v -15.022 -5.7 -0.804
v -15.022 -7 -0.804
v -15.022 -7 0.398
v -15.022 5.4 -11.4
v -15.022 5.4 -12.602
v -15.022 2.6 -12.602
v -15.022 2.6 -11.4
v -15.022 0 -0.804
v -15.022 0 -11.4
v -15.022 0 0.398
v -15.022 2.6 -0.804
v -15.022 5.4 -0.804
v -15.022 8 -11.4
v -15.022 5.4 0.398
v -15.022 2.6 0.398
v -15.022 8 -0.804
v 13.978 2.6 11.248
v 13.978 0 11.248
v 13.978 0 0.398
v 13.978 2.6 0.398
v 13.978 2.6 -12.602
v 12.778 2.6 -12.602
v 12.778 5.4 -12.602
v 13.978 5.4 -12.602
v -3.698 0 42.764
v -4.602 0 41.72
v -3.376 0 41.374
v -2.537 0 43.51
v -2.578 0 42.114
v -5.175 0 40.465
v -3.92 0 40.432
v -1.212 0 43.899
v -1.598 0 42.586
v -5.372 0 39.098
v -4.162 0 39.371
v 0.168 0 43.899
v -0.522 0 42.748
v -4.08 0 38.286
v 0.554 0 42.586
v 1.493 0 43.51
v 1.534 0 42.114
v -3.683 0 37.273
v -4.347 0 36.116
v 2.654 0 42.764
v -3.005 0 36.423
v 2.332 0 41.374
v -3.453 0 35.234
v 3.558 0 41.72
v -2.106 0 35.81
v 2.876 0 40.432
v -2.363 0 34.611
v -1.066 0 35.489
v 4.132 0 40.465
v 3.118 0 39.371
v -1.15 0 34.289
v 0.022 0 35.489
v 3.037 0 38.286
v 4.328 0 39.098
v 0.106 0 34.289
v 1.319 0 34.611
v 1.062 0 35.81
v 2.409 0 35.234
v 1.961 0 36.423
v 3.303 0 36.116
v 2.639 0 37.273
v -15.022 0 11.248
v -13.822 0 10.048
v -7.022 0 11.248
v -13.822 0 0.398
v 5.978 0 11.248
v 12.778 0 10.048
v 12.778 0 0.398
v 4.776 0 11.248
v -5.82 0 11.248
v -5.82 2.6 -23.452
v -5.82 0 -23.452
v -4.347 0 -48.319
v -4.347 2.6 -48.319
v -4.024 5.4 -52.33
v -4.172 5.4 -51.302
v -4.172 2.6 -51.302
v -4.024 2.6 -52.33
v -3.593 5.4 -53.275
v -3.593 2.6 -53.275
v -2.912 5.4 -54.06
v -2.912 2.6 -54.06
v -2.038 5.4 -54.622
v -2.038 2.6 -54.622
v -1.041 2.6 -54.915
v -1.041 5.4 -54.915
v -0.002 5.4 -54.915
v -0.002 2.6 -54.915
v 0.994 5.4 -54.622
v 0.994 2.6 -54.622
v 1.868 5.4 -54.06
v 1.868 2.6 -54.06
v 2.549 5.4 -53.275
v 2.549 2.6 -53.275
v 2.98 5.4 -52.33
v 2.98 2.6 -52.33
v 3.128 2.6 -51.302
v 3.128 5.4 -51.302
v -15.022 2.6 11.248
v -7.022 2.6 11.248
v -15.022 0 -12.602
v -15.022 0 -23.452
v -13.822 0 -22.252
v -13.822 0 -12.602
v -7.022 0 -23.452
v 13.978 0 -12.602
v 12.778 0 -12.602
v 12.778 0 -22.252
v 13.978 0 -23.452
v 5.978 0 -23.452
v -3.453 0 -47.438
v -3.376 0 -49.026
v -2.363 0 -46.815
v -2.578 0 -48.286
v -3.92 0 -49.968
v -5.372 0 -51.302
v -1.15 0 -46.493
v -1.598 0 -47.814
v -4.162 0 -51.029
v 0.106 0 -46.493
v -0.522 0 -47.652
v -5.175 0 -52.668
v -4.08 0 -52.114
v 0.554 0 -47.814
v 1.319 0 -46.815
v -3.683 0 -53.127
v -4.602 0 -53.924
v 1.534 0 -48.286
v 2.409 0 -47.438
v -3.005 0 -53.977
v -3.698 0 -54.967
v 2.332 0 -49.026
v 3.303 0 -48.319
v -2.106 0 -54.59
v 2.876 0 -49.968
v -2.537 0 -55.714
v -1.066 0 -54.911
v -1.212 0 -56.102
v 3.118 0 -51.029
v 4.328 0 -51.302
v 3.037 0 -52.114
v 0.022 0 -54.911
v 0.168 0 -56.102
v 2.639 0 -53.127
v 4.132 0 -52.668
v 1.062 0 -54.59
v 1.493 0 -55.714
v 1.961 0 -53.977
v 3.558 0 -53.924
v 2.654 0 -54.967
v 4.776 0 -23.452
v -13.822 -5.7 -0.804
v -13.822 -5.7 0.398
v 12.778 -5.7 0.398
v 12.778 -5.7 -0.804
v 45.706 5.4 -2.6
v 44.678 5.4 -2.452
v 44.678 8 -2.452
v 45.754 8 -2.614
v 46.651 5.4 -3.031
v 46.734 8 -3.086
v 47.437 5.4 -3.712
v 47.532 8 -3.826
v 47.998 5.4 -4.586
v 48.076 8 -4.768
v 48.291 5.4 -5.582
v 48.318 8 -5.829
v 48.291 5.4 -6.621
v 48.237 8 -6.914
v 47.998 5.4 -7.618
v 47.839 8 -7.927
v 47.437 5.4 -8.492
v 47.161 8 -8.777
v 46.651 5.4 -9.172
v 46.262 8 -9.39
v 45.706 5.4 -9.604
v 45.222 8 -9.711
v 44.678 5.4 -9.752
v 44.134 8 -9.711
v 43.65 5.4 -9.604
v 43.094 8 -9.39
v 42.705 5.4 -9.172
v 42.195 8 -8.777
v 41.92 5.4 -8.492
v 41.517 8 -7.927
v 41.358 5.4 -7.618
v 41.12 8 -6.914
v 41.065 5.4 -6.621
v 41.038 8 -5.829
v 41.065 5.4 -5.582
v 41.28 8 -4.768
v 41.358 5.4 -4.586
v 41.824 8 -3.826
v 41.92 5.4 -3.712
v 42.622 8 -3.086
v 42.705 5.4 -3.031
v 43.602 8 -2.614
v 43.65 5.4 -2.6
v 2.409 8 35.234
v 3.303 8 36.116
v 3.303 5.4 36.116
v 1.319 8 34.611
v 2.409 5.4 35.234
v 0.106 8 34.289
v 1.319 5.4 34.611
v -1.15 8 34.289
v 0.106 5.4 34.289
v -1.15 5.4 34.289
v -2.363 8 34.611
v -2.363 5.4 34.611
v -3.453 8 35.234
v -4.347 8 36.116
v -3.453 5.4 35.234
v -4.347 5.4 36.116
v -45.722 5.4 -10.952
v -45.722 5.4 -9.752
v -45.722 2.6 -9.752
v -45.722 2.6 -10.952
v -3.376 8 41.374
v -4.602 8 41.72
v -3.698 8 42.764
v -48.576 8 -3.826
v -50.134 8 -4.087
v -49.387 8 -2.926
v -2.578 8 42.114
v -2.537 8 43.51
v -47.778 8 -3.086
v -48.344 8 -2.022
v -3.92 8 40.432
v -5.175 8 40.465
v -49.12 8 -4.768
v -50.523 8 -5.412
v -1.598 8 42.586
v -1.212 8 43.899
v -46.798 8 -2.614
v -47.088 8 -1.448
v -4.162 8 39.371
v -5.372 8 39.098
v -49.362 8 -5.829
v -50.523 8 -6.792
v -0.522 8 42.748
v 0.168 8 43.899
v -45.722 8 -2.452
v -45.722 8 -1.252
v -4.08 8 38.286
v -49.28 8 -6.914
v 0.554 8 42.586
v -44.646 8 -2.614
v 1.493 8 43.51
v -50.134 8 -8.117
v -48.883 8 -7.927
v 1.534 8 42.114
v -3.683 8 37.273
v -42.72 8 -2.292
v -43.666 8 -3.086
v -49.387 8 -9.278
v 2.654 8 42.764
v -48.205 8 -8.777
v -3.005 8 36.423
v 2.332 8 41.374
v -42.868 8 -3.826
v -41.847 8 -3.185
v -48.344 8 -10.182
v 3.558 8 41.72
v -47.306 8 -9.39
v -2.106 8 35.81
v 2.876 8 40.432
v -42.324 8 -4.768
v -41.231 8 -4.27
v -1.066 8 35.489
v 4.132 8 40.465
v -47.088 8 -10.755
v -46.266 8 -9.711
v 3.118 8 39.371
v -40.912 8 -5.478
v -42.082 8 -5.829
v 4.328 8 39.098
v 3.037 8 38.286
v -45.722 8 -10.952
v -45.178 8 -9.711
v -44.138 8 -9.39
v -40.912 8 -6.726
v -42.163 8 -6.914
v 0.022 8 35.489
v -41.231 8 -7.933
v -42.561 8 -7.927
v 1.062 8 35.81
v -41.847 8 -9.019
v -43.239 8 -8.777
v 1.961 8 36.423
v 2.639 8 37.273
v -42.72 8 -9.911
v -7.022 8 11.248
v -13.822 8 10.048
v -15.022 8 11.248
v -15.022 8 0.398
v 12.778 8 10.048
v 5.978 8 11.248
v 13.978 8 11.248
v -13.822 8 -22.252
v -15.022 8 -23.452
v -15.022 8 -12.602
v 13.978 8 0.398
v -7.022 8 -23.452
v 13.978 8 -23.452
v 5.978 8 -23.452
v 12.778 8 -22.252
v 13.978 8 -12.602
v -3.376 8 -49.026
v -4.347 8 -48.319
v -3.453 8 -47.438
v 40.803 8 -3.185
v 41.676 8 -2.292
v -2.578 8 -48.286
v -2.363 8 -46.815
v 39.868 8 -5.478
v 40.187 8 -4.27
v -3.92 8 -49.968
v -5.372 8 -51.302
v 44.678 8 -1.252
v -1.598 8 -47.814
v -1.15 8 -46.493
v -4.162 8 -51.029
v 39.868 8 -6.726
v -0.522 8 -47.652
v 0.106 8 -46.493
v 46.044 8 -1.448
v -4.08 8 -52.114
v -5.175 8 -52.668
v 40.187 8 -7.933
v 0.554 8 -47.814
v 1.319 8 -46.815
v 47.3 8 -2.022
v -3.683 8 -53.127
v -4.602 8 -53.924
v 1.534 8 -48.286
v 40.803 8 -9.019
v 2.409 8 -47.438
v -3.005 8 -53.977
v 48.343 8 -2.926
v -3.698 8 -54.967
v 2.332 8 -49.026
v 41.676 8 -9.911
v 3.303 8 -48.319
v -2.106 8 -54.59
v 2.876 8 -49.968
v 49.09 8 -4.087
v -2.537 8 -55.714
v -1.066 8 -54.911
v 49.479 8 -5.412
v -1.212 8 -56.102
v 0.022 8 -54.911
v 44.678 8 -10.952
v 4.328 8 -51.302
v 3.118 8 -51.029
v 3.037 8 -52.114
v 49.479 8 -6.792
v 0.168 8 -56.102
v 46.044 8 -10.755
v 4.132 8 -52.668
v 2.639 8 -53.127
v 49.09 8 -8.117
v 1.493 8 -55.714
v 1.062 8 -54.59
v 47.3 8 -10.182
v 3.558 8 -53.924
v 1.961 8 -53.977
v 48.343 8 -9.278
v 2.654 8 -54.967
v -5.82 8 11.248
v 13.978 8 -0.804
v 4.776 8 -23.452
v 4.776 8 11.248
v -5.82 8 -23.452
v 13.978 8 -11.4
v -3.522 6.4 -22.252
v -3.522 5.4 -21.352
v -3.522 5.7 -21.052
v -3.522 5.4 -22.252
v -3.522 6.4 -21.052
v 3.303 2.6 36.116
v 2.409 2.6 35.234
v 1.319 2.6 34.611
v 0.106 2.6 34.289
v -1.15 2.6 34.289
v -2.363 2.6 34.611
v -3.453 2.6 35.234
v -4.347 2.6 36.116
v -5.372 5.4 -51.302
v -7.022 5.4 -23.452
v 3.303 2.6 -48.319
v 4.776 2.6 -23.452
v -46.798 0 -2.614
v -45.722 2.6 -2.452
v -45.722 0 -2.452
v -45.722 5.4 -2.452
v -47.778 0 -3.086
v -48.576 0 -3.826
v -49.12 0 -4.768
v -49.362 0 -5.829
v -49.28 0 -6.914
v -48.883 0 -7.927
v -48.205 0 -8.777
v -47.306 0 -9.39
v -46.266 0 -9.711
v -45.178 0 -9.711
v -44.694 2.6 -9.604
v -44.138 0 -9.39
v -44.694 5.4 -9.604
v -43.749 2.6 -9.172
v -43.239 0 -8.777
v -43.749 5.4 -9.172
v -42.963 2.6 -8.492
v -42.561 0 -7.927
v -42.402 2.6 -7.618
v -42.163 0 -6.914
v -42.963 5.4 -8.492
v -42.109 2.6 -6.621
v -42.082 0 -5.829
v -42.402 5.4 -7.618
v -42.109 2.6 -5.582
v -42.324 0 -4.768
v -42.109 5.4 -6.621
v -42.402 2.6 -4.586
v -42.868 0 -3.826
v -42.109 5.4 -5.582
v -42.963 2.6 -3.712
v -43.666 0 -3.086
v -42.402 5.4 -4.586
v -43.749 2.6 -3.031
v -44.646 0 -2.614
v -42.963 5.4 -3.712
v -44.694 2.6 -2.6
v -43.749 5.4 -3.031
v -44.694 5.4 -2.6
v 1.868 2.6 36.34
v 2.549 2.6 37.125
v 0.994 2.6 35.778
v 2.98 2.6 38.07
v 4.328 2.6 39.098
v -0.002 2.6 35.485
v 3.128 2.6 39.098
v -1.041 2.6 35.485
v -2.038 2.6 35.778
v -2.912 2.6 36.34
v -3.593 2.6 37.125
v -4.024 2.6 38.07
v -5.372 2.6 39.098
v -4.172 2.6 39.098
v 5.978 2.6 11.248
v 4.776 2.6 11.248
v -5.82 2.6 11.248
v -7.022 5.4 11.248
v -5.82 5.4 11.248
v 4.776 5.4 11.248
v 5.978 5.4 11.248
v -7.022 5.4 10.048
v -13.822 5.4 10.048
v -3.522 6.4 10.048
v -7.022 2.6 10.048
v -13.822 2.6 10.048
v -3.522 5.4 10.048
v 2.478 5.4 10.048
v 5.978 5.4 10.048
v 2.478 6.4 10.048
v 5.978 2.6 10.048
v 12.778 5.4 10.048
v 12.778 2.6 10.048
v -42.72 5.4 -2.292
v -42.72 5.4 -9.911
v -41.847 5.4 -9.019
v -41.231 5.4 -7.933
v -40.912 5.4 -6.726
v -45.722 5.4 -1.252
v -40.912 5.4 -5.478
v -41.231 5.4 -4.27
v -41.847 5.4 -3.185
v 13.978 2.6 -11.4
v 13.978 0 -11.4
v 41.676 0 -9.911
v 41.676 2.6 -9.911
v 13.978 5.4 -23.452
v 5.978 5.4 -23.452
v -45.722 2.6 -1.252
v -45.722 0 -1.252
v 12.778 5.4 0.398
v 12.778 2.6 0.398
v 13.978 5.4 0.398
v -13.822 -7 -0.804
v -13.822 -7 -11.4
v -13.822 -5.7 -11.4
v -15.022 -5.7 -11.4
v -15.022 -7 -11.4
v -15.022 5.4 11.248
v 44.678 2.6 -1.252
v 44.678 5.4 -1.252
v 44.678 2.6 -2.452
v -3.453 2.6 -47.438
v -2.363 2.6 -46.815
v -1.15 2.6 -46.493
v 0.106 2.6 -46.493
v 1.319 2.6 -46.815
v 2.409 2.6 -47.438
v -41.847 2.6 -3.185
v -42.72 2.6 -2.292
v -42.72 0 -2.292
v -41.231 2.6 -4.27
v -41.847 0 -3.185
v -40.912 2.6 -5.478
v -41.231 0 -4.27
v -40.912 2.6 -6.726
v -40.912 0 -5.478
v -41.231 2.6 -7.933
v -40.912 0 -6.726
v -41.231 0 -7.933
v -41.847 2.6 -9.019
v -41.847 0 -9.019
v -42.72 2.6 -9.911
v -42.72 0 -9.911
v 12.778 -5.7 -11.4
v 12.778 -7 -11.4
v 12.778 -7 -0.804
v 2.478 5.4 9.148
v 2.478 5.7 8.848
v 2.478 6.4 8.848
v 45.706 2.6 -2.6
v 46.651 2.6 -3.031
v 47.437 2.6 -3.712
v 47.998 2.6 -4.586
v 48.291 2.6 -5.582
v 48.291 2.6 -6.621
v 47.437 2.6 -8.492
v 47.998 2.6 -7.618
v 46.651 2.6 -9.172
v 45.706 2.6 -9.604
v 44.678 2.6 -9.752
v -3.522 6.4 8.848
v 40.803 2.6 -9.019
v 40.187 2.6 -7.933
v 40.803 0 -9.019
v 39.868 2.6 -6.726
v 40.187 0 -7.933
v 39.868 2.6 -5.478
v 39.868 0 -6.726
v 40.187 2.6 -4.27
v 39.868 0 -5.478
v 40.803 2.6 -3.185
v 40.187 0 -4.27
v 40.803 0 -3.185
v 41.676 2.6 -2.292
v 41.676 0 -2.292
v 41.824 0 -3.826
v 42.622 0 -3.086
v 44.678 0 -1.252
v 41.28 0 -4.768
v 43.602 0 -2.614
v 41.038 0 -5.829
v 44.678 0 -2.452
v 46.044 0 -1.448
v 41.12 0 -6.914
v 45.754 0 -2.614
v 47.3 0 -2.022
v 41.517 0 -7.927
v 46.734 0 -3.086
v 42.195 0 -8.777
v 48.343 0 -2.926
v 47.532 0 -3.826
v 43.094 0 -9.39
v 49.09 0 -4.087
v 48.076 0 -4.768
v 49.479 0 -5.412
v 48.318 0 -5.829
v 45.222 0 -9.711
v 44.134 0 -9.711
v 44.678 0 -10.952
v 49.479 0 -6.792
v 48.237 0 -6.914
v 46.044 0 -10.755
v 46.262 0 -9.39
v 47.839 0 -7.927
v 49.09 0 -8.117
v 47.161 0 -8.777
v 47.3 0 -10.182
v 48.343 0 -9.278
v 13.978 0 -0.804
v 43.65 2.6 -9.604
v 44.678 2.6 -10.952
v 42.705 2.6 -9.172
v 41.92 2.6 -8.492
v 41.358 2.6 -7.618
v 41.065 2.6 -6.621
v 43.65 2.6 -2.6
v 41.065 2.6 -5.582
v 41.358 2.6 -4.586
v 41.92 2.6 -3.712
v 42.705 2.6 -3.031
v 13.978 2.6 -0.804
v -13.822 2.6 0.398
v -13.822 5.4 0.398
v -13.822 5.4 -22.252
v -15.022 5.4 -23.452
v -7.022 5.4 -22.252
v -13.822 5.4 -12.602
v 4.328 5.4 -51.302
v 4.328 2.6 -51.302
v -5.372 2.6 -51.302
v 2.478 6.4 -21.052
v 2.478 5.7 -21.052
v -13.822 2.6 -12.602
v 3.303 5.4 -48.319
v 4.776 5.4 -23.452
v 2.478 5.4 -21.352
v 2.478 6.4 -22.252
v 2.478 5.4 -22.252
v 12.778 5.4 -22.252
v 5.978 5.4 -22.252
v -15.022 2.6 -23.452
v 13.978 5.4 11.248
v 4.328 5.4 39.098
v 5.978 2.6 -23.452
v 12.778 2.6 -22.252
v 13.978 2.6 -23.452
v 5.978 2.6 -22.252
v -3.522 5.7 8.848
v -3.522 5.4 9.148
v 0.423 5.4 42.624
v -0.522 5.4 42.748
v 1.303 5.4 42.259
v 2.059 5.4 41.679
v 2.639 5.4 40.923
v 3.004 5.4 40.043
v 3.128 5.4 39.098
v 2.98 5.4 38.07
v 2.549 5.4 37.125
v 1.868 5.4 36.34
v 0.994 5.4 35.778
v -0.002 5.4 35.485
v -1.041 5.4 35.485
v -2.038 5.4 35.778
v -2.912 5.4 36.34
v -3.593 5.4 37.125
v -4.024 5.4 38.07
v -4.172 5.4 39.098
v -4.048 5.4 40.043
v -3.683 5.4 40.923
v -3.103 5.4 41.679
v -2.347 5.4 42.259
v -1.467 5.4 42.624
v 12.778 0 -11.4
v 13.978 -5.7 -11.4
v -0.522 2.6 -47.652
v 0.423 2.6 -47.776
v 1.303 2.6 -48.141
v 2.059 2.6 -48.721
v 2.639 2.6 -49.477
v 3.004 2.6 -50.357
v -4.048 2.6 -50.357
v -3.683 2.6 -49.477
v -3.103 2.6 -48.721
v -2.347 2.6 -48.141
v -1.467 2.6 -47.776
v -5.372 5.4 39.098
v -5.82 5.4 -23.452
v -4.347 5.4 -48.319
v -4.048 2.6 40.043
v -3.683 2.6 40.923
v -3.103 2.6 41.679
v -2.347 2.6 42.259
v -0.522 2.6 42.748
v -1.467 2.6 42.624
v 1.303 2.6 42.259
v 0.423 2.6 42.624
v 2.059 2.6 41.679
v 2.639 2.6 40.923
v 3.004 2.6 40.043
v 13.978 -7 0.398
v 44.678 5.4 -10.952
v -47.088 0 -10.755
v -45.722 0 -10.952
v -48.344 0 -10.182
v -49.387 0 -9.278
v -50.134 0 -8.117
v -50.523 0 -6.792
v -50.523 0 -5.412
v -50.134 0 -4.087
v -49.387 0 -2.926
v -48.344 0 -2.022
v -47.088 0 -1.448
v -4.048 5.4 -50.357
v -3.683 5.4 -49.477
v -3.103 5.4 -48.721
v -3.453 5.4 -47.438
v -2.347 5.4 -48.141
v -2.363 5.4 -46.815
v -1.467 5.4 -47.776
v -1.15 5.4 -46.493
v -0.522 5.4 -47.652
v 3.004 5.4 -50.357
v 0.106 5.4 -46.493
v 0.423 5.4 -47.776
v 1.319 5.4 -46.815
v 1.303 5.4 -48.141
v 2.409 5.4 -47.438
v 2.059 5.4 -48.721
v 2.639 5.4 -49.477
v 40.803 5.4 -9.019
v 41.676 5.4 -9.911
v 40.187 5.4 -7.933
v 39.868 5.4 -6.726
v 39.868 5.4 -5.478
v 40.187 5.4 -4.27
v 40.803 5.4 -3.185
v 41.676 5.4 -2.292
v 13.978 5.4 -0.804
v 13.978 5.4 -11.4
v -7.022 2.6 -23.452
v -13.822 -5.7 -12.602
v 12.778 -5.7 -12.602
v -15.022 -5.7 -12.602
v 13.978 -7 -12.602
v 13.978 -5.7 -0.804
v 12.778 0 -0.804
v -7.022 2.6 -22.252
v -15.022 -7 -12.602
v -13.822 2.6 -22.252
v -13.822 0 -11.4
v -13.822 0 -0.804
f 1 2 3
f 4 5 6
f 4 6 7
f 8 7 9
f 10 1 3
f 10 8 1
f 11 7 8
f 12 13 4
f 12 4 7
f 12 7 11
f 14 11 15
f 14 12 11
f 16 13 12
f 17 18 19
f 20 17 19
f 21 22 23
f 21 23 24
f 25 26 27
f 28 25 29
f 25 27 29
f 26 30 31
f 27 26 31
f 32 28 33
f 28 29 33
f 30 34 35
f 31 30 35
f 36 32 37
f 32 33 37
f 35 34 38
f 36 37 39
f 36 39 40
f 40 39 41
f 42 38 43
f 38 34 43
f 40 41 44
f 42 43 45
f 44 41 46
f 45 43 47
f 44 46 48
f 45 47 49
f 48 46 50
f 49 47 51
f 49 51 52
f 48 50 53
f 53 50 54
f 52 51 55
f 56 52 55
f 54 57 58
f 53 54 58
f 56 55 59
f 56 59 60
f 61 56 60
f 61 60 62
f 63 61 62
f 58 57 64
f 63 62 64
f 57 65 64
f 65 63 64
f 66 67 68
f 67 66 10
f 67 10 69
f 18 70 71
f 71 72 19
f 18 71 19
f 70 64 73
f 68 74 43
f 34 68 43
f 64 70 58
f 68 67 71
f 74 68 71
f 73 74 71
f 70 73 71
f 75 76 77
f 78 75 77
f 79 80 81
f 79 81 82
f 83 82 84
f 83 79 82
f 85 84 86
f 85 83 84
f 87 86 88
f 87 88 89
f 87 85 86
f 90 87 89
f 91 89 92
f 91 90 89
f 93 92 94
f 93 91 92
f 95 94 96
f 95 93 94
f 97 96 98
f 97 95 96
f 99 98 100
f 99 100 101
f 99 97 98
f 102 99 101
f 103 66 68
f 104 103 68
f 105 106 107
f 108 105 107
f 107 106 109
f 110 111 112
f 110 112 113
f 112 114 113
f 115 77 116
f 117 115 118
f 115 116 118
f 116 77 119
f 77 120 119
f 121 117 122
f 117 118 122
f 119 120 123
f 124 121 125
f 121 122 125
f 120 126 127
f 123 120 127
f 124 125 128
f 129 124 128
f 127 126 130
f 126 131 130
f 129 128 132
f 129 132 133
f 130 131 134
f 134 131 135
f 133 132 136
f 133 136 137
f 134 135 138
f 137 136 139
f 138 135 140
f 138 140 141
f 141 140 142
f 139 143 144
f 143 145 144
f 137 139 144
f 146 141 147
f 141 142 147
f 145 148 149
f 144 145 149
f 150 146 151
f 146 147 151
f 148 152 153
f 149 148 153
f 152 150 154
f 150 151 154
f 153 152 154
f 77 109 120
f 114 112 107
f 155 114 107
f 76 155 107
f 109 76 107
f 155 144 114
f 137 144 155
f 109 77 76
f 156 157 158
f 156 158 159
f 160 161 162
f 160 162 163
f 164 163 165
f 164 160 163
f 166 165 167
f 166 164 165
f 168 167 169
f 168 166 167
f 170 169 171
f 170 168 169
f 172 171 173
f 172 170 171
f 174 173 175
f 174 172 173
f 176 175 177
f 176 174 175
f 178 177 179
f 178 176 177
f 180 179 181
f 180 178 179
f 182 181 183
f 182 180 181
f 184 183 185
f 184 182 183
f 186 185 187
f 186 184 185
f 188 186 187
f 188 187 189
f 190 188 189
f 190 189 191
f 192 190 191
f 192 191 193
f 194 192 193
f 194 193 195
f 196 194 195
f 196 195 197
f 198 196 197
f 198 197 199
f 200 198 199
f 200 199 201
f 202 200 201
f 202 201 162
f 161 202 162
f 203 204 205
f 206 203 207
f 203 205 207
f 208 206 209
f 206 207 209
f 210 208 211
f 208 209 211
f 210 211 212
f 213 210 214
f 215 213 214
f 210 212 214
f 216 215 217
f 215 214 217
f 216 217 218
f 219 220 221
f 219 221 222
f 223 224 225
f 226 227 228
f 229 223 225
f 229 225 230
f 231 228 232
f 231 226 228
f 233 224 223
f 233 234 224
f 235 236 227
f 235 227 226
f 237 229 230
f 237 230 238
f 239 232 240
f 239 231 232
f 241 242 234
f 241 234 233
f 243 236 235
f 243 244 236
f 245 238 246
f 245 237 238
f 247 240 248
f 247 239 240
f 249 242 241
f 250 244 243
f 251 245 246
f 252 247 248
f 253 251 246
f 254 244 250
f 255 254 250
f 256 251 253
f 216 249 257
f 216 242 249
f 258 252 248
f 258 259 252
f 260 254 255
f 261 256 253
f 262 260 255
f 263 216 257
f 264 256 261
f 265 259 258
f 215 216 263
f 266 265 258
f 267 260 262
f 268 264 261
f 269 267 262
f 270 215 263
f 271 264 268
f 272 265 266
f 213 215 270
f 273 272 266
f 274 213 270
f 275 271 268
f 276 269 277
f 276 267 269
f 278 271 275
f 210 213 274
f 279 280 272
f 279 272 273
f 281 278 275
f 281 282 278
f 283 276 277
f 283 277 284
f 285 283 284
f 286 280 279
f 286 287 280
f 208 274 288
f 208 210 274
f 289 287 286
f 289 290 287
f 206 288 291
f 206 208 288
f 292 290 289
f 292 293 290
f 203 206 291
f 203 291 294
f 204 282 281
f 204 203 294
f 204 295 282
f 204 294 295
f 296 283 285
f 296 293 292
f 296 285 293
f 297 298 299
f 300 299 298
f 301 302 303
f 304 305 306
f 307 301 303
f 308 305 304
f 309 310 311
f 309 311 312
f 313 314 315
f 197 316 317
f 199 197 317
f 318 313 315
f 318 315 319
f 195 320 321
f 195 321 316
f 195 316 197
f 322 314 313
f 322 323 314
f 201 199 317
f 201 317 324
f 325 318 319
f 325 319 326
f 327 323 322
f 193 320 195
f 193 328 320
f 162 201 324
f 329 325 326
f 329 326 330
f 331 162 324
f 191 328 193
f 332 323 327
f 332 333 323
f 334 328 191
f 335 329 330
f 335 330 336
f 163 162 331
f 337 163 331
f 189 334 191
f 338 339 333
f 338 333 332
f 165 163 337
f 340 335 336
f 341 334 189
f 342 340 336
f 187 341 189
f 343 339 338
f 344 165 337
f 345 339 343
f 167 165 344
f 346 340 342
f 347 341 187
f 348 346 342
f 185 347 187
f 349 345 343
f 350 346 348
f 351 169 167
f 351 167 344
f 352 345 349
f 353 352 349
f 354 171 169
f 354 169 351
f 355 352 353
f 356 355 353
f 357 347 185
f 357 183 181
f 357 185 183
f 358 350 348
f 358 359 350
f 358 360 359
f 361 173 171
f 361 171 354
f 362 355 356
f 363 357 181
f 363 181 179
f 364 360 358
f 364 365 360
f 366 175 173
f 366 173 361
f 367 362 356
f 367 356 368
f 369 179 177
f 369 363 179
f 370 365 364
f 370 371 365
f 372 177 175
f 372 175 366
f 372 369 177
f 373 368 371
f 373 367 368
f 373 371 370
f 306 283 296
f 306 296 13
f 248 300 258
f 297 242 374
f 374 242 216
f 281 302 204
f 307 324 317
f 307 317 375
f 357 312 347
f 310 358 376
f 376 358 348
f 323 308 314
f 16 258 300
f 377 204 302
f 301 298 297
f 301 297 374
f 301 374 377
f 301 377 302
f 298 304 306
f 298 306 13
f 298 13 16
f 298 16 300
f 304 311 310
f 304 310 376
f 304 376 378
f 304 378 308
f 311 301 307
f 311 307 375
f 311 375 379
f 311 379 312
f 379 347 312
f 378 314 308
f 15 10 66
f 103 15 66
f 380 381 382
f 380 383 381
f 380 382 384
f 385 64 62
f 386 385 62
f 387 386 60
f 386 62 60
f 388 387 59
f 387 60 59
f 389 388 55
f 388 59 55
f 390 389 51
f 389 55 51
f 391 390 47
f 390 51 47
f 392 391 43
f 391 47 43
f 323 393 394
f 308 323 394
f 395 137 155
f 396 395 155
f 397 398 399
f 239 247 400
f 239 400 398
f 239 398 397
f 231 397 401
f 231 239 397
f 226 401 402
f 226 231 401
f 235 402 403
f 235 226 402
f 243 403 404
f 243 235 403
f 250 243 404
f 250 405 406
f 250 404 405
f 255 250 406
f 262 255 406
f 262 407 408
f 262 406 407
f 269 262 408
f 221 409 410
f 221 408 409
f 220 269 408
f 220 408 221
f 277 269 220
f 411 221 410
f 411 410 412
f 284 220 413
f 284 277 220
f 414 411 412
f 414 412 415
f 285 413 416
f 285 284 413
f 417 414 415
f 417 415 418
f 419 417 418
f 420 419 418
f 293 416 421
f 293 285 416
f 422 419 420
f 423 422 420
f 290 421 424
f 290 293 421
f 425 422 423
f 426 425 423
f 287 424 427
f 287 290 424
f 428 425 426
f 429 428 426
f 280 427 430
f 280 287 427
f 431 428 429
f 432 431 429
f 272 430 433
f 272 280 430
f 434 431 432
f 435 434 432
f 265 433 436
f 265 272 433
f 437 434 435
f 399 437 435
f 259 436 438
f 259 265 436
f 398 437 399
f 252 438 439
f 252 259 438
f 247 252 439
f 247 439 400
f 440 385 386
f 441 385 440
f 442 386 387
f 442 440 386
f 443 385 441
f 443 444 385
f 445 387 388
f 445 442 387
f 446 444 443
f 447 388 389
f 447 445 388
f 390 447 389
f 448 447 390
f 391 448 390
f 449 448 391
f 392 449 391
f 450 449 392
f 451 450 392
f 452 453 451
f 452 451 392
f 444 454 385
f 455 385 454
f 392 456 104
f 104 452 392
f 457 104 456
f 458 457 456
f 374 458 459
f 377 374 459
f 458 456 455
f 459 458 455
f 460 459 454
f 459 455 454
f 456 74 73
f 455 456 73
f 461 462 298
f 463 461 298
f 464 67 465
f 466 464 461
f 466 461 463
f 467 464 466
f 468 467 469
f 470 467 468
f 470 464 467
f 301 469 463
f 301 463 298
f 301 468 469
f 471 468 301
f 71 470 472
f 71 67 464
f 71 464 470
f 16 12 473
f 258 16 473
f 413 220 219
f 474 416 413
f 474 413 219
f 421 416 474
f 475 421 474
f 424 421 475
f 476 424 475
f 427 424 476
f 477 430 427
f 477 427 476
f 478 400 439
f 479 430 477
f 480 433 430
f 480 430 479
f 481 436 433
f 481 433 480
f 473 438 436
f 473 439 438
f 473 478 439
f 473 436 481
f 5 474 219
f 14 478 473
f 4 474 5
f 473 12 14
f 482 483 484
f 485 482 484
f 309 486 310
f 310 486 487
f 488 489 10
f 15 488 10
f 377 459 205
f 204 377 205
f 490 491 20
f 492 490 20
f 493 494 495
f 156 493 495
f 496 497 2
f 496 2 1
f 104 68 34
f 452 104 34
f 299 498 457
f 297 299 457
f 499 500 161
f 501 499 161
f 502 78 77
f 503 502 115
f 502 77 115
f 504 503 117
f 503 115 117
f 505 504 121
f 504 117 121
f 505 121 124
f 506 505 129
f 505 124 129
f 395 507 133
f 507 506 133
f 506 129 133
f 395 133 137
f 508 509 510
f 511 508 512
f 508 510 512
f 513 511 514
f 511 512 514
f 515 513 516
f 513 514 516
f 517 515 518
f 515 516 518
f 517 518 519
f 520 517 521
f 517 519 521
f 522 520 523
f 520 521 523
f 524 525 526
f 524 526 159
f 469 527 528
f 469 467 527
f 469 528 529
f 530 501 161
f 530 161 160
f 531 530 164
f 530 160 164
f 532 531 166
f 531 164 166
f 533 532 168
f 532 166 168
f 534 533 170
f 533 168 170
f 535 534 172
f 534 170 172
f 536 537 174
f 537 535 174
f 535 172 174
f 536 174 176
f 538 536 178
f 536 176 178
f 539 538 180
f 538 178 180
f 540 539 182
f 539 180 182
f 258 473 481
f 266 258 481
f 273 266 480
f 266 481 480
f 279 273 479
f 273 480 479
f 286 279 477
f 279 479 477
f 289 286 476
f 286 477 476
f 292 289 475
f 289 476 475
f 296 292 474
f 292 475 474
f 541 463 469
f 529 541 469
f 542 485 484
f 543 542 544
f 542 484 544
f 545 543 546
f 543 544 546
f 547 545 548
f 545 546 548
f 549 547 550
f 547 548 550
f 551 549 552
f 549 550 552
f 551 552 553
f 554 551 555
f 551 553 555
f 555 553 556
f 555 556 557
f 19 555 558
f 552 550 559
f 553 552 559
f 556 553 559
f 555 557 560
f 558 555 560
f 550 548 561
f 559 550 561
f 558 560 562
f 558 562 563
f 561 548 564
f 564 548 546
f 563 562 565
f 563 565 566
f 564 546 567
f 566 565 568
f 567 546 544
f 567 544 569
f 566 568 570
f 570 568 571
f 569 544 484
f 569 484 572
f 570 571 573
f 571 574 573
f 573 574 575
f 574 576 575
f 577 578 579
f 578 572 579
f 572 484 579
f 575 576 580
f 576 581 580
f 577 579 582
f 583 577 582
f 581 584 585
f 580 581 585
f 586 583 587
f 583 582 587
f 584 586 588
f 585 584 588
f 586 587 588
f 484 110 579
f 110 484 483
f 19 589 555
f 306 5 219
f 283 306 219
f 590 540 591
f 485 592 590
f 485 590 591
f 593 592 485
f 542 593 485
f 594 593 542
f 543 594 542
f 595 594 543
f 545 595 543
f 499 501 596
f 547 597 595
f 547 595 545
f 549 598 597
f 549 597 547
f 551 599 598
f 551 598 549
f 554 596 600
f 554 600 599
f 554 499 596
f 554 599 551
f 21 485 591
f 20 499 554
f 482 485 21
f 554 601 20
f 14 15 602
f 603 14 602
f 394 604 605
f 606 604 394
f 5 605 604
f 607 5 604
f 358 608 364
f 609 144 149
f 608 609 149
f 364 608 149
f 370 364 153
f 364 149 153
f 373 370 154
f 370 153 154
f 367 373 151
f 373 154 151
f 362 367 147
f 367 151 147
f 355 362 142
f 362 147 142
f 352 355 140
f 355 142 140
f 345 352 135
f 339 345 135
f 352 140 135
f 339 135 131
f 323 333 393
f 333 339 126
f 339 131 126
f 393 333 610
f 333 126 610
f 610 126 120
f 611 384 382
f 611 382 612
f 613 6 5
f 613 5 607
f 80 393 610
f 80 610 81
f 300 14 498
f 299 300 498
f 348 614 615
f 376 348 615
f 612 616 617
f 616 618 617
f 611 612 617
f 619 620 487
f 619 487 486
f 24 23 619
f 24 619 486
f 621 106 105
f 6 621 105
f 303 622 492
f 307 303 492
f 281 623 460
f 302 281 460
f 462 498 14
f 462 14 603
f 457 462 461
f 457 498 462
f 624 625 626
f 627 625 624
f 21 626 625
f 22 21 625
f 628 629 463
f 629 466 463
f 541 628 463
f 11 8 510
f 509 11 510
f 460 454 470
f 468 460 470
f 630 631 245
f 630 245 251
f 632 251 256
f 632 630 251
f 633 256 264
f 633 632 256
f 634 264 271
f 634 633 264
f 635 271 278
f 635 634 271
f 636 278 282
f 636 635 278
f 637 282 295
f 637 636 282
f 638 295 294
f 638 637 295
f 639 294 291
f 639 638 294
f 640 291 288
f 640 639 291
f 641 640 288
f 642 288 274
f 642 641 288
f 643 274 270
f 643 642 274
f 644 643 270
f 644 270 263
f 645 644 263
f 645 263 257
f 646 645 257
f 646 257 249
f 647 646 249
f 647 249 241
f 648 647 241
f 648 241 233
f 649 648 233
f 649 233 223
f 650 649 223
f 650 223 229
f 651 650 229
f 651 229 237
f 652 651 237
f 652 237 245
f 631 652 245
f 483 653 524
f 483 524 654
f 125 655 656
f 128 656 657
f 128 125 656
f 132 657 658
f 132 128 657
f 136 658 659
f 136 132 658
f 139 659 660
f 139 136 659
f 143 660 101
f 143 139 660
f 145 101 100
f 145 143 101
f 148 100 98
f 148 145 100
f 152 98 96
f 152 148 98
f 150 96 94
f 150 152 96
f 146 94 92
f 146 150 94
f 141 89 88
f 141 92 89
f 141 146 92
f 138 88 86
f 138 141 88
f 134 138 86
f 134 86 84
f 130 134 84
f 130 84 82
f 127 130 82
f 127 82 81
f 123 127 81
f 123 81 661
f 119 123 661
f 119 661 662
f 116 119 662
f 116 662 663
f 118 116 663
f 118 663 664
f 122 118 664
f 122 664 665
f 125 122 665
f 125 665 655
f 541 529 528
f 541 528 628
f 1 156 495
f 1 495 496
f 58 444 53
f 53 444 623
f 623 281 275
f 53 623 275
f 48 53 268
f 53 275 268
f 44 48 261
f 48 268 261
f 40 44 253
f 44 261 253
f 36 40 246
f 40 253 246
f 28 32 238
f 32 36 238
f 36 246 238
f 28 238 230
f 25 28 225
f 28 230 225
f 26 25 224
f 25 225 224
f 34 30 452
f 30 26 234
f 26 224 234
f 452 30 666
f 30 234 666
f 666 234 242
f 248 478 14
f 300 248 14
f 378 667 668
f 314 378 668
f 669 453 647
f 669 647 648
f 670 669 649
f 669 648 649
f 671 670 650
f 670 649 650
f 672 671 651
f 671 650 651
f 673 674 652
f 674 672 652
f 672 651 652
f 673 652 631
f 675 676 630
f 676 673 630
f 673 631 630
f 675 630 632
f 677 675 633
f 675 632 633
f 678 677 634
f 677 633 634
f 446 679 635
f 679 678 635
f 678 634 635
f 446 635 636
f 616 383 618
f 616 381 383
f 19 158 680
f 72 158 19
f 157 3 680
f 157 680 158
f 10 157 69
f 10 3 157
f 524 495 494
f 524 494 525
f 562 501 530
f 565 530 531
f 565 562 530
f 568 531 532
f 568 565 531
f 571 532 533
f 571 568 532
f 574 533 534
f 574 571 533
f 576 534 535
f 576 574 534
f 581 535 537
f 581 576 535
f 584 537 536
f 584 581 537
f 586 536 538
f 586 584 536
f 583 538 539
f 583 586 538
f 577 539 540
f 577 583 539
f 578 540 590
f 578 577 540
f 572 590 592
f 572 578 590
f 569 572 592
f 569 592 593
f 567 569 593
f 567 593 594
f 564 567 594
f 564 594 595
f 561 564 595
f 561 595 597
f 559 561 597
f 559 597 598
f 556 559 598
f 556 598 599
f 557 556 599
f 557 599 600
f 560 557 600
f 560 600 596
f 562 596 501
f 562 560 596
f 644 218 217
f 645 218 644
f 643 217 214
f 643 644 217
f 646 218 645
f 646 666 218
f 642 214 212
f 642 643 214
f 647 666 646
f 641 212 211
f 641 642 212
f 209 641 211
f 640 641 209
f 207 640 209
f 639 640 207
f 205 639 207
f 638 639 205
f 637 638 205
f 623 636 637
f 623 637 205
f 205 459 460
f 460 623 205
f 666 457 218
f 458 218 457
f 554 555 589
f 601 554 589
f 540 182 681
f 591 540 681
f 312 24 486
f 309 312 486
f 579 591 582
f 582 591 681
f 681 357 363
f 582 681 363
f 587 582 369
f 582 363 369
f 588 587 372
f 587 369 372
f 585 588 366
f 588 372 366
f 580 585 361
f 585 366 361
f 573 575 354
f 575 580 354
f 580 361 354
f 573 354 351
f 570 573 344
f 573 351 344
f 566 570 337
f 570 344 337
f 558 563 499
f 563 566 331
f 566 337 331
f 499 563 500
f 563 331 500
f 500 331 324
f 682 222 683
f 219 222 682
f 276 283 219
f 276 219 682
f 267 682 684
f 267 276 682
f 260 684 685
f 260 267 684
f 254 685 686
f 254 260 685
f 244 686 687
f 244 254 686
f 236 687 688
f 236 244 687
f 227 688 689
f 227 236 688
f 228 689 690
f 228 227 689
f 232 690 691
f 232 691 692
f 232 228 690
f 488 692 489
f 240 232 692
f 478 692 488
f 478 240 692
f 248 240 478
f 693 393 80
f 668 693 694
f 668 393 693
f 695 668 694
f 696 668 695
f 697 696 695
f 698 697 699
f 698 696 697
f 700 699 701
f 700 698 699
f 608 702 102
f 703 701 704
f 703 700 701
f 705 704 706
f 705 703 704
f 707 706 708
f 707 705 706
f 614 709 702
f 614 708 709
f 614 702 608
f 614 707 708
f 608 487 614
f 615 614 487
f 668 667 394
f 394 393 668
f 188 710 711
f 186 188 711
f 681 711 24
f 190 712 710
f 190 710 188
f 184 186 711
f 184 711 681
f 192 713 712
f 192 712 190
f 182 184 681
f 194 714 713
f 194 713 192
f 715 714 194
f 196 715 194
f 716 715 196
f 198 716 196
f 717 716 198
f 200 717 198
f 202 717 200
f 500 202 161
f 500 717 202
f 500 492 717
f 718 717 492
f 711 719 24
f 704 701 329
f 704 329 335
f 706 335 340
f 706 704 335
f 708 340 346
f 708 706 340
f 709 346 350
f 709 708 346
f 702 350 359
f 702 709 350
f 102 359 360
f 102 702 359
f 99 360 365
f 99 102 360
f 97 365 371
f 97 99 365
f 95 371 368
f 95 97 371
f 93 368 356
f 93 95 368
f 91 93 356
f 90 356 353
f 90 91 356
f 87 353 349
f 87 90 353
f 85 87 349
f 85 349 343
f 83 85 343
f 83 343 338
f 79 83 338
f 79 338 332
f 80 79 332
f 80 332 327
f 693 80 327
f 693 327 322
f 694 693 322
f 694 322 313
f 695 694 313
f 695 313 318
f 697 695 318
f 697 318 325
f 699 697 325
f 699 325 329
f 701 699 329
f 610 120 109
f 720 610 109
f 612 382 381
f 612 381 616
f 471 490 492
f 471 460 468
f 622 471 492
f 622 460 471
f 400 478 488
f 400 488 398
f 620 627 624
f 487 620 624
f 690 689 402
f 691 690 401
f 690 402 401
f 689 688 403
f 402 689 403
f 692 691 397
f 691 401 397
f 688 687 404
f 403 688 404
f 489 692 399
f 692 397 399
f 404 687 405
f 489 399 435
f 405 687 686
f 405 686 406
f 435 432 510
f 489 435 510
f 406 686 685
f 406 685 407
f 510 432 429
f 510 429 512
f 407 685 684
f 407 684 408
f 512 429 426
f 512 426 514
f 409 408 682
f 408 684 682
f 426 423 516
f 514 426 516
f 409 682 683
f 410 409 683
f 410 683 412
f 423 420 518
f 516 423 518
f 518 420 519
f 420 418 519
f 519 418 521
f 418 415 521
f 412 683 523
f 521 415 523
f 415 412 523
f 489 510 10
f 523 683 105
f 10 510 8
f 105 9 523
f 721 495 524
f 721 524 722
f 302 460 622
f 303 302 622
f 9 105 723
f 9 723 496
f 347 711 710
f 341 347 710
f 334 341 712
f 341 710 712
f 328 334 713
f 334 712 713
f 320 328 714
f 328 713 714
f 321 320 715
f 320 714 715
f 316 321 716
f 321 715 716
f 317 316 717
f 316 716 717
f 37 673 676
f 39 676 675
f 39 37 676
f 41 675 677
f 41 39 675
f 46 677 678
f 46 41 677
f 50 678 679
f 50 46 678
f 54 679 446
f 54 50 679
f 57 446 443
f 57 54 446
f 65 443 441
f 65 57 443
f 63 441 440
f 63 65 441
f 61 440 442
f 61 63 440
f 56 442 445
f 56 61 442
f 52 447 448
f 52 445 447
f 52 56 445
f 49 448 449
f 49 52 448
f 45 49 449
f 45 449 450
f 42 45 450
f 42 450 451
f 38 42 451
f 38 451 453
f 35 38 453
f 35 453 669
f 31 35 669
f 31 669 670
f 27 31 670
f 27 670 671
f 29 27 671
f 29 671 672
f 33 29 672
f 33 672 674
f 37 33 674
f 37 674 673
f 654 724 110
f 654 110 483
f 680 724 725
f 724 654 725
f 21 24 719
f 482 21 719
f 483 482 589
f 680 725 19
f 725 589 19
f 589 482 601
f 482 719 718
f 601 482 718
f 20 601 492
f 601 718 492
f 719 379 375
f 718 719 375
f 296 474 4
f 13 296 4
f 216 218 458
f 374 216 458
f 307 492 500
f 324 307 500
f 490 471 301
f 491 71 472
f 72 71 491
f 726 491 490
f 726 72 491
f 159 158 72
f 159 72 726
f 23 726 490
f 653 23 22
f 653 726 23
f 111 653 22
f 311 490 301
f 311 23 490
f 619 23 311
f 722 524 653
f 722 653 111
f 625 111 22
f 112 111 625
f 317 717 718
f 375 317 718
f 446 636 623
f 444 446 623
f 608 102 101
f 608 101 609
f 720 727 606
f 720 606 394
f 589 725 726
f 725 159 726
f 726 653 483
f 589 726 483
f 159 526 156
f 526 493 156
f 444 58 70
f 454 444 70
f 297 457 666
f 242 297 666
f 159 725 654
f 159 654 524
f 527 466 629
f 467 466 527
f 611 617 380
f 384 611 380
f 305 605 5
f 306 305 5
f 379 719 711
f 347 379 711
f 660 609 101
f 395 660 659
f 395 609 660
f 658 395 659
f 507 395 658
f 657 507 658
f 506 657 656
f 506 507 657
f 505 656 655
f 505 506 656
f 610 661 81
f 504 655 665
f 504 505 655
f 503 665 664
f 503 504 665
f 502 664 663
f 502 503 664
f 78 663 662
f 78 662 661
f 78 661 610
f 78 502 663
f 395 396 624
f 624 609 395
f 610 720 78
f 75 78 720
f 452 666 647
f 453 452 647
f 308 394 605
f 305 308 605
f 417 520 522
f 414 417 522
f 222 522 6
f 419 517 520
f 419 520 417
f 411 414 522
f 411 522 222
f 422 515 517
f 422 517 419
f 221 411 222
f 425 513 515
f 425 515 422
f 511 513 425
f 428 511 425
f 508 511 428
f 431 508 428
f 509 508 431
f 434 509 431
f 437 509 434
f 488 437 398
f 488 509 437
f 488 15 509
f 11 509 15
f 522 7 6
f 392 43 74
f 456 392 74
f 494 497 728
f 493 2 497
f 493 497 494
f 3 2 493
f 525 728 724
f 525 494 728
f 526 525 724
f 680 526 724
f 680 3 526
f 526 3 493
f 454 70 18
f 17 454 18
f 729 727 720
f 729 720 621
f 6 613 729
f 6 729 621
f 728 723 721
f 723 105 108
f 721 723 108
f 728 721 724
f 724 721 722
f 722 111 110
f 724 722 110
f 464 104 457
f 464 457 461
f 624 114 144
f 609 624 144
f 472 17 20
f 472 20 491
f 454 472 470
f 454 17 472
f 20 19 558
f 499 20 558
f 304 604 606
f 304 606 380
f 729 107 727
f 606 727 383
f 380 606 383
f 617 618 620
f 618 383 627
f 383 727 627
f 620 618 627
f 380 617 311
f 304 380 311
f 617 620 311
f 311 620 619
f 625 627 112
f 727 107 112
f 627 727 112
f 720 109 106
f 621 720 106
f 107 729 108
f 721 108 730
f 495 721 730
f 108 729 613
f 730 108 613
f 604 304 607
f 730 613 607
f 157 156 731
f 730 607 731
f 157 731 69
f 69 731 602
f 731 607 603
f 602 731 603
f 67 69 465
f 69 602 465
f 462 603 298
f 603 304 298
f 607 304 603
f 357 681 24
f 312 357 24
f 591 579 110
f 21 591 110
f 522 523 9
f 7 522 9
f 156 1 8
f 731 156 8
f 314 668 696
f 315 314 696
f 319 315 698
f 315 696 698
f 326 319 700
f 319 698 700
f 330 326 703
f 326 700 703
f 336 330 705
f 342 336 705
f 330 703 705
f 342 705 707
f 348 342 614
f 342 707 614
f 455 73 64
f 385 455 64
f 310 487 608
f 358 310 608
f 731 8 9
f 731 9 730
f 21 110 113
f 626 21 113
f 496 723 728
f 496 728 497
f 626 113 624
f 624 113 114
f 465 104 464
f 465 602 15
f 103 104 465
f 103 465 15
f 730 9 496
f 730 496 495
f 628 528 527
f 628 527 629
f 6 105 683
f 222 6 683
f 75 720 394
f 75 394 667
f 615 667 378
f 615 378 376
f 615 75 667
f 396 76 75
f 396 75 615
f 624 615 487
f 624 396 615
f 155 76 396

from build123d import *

# Parameters (mm, degrees)
SKETCH1_R               = 3.65
SKETCH1_W               = 26.6
SKETCH1_H               = 32.3
BOSS_EXTRUDE1_DEPTH     = 8
SKETCH2_W               = 3
SKETCH2_H               = 0.7
BOSS_EXTRUDE2_DEPTH     = 1.2
SKETCH3_W               = 3
SKETCH3_H               = 0.7
BOSS_EXTRUDE3_DEPTH     = 1.2
CHAMFER1_SIZE           = 1.2
CUT_EXTRUDE1_DEPTH      = 85.642077968
CUT_EXTRUDE1_DEPTH_BACK = 85.642077968
SKETCH4_W               = 48.801078557
SKETCH4_H               = 1.4
SKETCH4_W_2             = 10.59579159
SKETCH4_W_3             = 46.838011079
BOSS_EXTRUDE4_START     = -5.4
SKETCH5_W               = 13
SKETCH5_H               = 1.2
SKETCH5_W_2             = 1.2
SKETCH5_H_2             = 13
BOSS_EXTRUDE4_DEPTH     = 2.8
BOSS_EXTRUDE5_REACH     = 77.99
SKETCH7_W               = 1.2
SKETCH7_H               = 1.202104206
SKETCH7_H_2             = 1.201731925
BOSS_EXTRUDE6_DEPTH     = 7
SKETCH8_W               = 1.202104206
SKETCH8_H               = 1.3
SKETCH8_W_2             = 1.201731925
BOSS_EXTRUDE7_DEPTH     = 26.6
SKETCH9_W               = 1.2
SKETCH9_H               = 1.3
BOSS_EXTRUDE8_DEPTH     = 11.797895795


with BuildPart() as part:
    # Sketch1 → Boss-Extrude1 (new body)
    with BuildSketch(Plane(origin=(0, 0, 0), x_dir=(1, 0, 0), z_dir=(0, 1, 0))):
        with BuildLine():
            Line((-7.021942446, 23.451798561), (-15.021942446, 23.451798561))
            Line((-15.021942446, 23.451798561), (-15.021942446, 12.601798561))
            Line((-15.021942446, 12.601798561), (-45.721942446, 10.951798561))
            ThreePointArc((-45.721942446, 10.951798561), (-50.571942446, 6.101798561), (-45.721942446, 1.251798561))
            Line((-45.721942446, 1.251798561), (-15.021942446, -0.398201439))
            Line((-15.021942446, -0.398201439), (-15.021942446, -11.248201439))
            Line((-15.021942446, -11.248201439), (-7.021942446, -11.248201439))
            Line((-7.021942446, -11.248201439), (-5.371942446, -39.098201439))
            ThreePointArc((-5.371942446, -39.098201439), (-0.521942446, -43.948201439), (4.328057554, -39.098201439))
            Line((4.328057554, -39.098201439), (5.978057554, -11.248201439))
            Line((5.978057554, -11.248201439), (13.978057554, -11.248201439))
            Line((13.978057554, -11.248201439), (13.978057554, -0.398201439))
            Line((13.978057554, -0.398201439), (44.678057554, 1.251798561))
            ThreePointArc((44.678057554, 1.251798561), (49.528057554, 6.101798561), (44.678057554, 10.951798561))
            Line((44.678057554, 10.951798561), (13.978057554, 12.601798561))
            Line((13.978057554, 12.601798561), (13.978057554, 23.451798561))
            Line((13.978057554, 23.451798561), (5.978057554, 23.451798561))
            Line((5.978057554, 23.451798561), (4.328057554, 51.301798561))
            ThreePointArc((4.328057554, 51.301798561), (-0.521942446, 56.151798561), (-5.371942446, 51.301798561))
            Line((-5.371942446, 51.301798561), (-7.021942446, 23.451798561))
        make_face()
        with Locations(Location((-0.521942446, -39.098201439, 0), (0, 0, 270))):
            Circle(SKETCH1_R, mode=Mode.SUBTRACT)
        with BuildLine():
            Line((4.775953349, -11.248201439), (3.302651218, -36.115755579))
            ThreePointArc((3.302651218, -36.115755579), (-0.521942446, -34.248201439), (-4.34653611, -36.115755579))
            Line((-4.34653611, -36.115755579), (-5.819838241, -11.248201439))
            Line((-5.819838241, -11.248201439), (4.775953349, -11.248201439))
        make_face(mode=Mode.SUBTRACT)
        with Locations(Location((-45.721942446, 6.101798561, 0), (0, 0, 270))):
            Circle(SKETCH1_R, mode=Mode.SUBTRACT)
        with BuildLine():
            Line((-42.720356894, 9.911389638), (-15.021942446, 11.400066636))
            Line((-15.021942446, 11.400066636), (-15.021942446, 0.803530486))
            Line((-15.021942446, 0.803530486), (-42.720356894, 2.292207484))
            ThreePointArc((-42.720356894, 2.292207484), (-40.871942446, 6.101798561), (-42.720356894, 9.911389638))
        make_face(mode=Mode.SUBTRACT)
        with Locations((-0.521942446, 6.101798561)):
            Rectangle(SKETCH1_W, SKETCH1_H, mode=Mode.SUBTRACT)
        with BuildLine():
            Line((-5.819838241, 23.451798561), (-4.34653611, 48.319352702))
            ThreePointArc((-4.34653611, 48.319352702), (-0.521942446, 46.451798561), (3.302651218, 48.319352702))
            Line((3.302651218, 48.319352702), (4.775953349, 23.451798561))
            Line((4.775953349, 23.451798561), (-5.819838241, 23.451798561))
        make_face(mode=Mode.SUBTRACT)
        with Locations(Location((-0.521942446, 51.301798561, 0), (0, 0, 270))):
            Circle(SKETCH1_R, mode=Mode.SUBTRACT)
        with BuildLine():
            Line((41.676472002, 2.292207484), (13.978057554, 0.803530486))
            Line((13.978057554, 0.803530486), (13.978057554, 11.400066636))
            Line((13.978057554, 11.400066636), (41.676472002, 9.911389638))
            ThreePointArc((41.676472002, 9.911389638), (39.828057554, 6.101798561), (41.676472002, 2.292207484))
        make_face(mode=Mode.SUBTRACT)
        with Locations(Location((44.678057554, 6.101798561, 0), (0, 0, 270))):
            Circle(SKETCH1_R, mode=Mode.SUBTRACT)
    extrude(amount=BOSS_EXTRUDE1_DEPTH)

    # Sketch2 → Boss-Extrude2 (add)
    with BuildSketch(Plane.XY.offset(-22.251798561)):
        with Locations((-2.021942446, 6.05)):
            Rectangle(SKETCH2_W, SKETCH2_H)
        with Locations((0.978057554, 6.05)):
            Rectangle(SKETCH2_W, SKETCH2_H)
    extrude(amount=BOSS_EXTRUDE2_DEPTH)

    # Sketch3 → Boss-Extrude3 (add)
    with BuildSketch(Plane(origin=(0, 0, 10.048201439), x_dir=(-1, 0, 0), z_dir=(0, 0, -1))):
        with Locations((-0.978057554, 6.05)):
            Rectangle(SKETCH3_W, SKETCH3_H)
        with Locations((2.021942446, 6.05)):
            Rectangle(SKETCH3_W, SKETCH3_H)
    extrude(amount=BOSS_EXTRUDE3_DEPTH)

    # Chamfer1
    chamfer1_edges = [part.edges().sort_by_distance(p)[0] for p in [
        (-0.521942446, 5.7, -22.251798561),
        (-0.521942446, 5.7, 10.048201439),
    ]]
    chamfer(chamfer1_edges, length=CHAMFER1_SIZE - 0.0001)  # a hair under: the kernel refuses the full size

    # Sketch4 → Cut-Extrude1 (cut, two sides: drawn at the far end of the back side and taken through both)
    with BuildSketch(Plane(origin=(0, 0, -23.451798561), x_dir=(-1, 0, 0), z_dir=(0, 0, -1)).offset(-CUT_EXTRUDE1_DEPTH_BACK)):
        with Locations((-29.176492628, 3.3)):
            Rectangle(SKETCH4_W, SKETCH4_H)
        with Locations((-29.176492628, 4.7)):
            Rectangle(SKETCH4_W, SKETCH4_H)
        with Locations((0.521942446, 4.7)):
            Rectangle(SKETCH4_W_2, SKETCH4_H)
        with Locations((0.521942446, 3.3)):
            Rectangle(SKETCH4_W_2, SKETCH4_H)
        with Locations((29.238843781, 3.3)):
            Rectangle(SKETCH4_W_3, SKETCH4_H)
        with Locations((29.238843781, 4.7)):
            Rectangle(SKETCH4_W_3, SKETCH4_H)
    extrude(amount=CUT_EXTRUDE1_DEPTH + CUT_EXTRUDE1_DEPTH_BACK, mode=Mode.SUBTRACT)


with BuildPart() as cut_extrude1_piece_1:
    # of the separate pieces the step leaves, piece 1, a body of its own (cut_extrude1_pieces)
    add(part.part.solids().sort_by_distance((-3.521942446, 6.4, 10.048201439))[0])



with BuildPart() as cut_extrude1_piece_2:
    # of the separate pieces the step leaves, piece 2, a body of its own (cut_extrude1_pieces)
    add(part.part.solids().sort_by_distance((12.778057554, 2.6, 10.048201439))[0])


with BuildPart() as cut_extrude1_piece_1_1:
    add(cut_extrude1_piece_1.part)

    add(cut_extrude1_piece_2.part)  # Boss-Extrude4 merges Cut-Extrude1 piece 2
    # Sketch5 → Boss-Extrude4 (add)
    with BuildSketch(Plane(origin=(0, 8, 0), x_dir=(1, 0, 0), z_dir=(0, 1, 0)).offset(BOSS_EXTRUDE4_START)):
        with Locations((-0.521942446, 22.851798561)):
            Rectangle(SKETCH5_W, SKETCH5_H)
        with Locations((-0.521942446, -10.648201439)):
            Rectangle(SKETCH5_W, SKETCH5_H)
        with Locations((-14.421942446, 6.101798561)):
            Rectangle(SKETCH5_W_2, SKETCH5_H_2)
        with Locations((13.378057554, 6.101798561)):
            Rectangle(SKETCH5_W_2, SKETCH5_H_2)
    extrude(amount=BOSS_EXTRUDE4_DEPTH)

    # Sketch6 → Boss-Extrude5 (add, up to next)
    with BuildSketch(Plane(origin=(0, 8, 0), x_dir=(1, 0, 0), z_dir=(0, 1, 0)), mode=Mode.PRIVATE) as boss_extrude5_sk1:
        with BuildLine():
            Line((-5.371942446, 51.301798561), (-4.171942446, 51.301798561))
            ThreePointArc((-4.171942446, 51.301798561), (-0.521942446, 54.951798561), (3.128057554, 51.301798561))
            Line((3.128057554, 51.301798561), (4.328057554, 51.301798561))
            ThreePointArc((4.328057554, 51.301798561), (-0.521942446, 56.151798561), (-5.371942446, 51.301798561))
        make_face()
    boss_extrude5_tool1 = extrude(boss_extrude5_sk1.sketch, amount=-BOSS_EXTRUDE5_REACH, mode=Mode.PRIVATE) - cut_extrude1_piece_1_1.part
    # Sketch6 → Boss-Extrude5 (add, up to next)
    with BuildSketch(Plane(origin=(0, 8, 0), x_dir=(1, 0, 0), z_dir=(0, 1, 0)), mode=Mode.PRIVATE) as boss_extrude5_sk2:
        with BuildLine():
            Line((3.128057554, -39.098201439), (4.328057554, -39.098201439))
            ThreePointArc((4.328057554, -39.098201439), (-0.521942446, -43.948201439), (-5.371942446, -39.098201439))
            Line((-5.371942446, -39.098201439), (-4.171942446, -39.098201439))
            ThreePointArc((-4.171942446, -39.098201439), (-0.521942446, -42.748201439), (3.128057554, -39.098201439))
        make_face()
    boss_extrude5_tool2 = extrude(boss_extrude5_sk2.sketch, amount=-BOSS_EXTRUDE5_REACH, mode=Mode.PRIVATE) - cut_extrude1_piece_1_1.part
    # Sketch6 → Boss-Extrude5 (add, up to next)
    with BuildSketch(Plane(origin=(0, 8, 0), x_dir=(1, 0, 0), z_dir=(0, 1, 0)), mode=Mode.PRIVATE) as boss_extrude5_sk3:
        with BuildLine():
            Line((44.678057554, 9.751798561), (44.678057554, 10.951798561))
            ThreePointArc((44.678057554, 10.951798561), (49.528057554, 6.101798561), (44.678057554, 1.251798561))
            Line((44.678057554, 1.251798561), (44.678057554, 2.451798561))
            ThreePointArc((44.678057554, 2.451798561), (48.328057554, 6.101798561), (44.678057554, 9.751798561))
        make_face()
    boss_extrude5_tool3 = extrude(boss_extrude5_sk3.sketch, amount=-BOSS_EXTRUDE5_REACH, mode=Mode.PRIVATE) - cut_extrude1_piece_1_1.part
    # Sketch6 → Boss-Extrude5 (add, up to next)
    with BuildSketch(Plane(origin=(0, 8, 0), x_dir=(1, 0, 0), z_dir=(0, 1, 0)), mode=Mode.PRIVATE) as boss_extrude5_sk4:
        with BuildLine():
            Line((-45.721942446, 1.251798561), (-45.721942446, 2.451798561))
            ThreePointArc((-45.721942446, 2.451798561), (-49.371942446, 6.101798561), (-45.721942446, 9.751798561))
            Line((-45.721942446, 9.751798561), (-45.721942446, 10.951798561))
            ThreePointArc((-45.721942446, 10.951798561), (-50.571942446, 6.101798561), (-45.721942446, 1.251798561))
        make_face()
    boss_extrude5_tool4 = extrude(boss_extrude5_sk4.sketch, amount=-BOSS_EXTRUDE5_REACH, mode=Mode.PRIVATE) - cut_extrude1_piece_1_1.part
    add(boss_extrude5_tool1.solids().sort_by_distance((-4.771942, 8, -51.410248))[0])
    add(boss_extrude5_tool2.solids().sort_by_distance((-0.521942, 8, 43.839752))[0])
    add(boss_extrude5_tool3.solids().sort_by_distance((44.786507, 8, -10.351799))[0])
    add(boss_extrude5_tool4.solids().sort_by_distance((-45.830392, 8, -10.351799))[0])

    # Sketch7 → Boss-Extrude6 (add)
    with BuildSketch(Plane.XZ):
        with Locations((-14.421942446, -0.202850664)):
            Rectangle(SKETCH7_W, SKETCH7_H)
        with Locations((-14.421942446, -12.000932599)):
            Rectangle(SKETCH7_W, SKETCH7_H_2)
        with Locations((13.378057554, -0.202850664)):
            Rectangle(SKETCH7_W, SKETCH7_H)
        with Locations((13.378057554, -12.000932599)):
            Rectangle(SKETCH7_W, SKETCH7_H_2)
    extrude(amount=BOSS_EXTRUDE6_DEPTH)

    # Sketch8 → Boss-Extrude7 (add)
    with BuildSketch(Plane(origin=(-13.821942446, 0, 0), x_dir=(0, 0, -1), z_dir=(1, 0, 0))):
        with Locations((0.202850664, -6.35)):
            Rectangle(SKETCH8_W, SKETCH8_H)
        with Locations((12.000932599, -6.35)):
            Rectangle(SKETCH8_W_2, SKETCH8_H)
    extrude(amount=BOSS_EXTRUDE7_DEPTH)

    # Sketch9 → Boss-Extrude8 (add)
    with BuildSketch(Plane(origin=(0, 0, -12.601798561), x_dir=(-1, 0, 0), z_dir=(0, 0, -1))):
        with Locations((-13.378057554, -6.35)):
            Rectangle(SKETCH9_W, SKETCH9_H)
        with Locations((14.421942446, -6.35)):
            Rectangle(SKETCH9_W, SKETCH9_H)
    extrude(amount=-BOSS_EXTRUDE8_DEPTH)


solid = cut_extrude1_piece_1_1.part
